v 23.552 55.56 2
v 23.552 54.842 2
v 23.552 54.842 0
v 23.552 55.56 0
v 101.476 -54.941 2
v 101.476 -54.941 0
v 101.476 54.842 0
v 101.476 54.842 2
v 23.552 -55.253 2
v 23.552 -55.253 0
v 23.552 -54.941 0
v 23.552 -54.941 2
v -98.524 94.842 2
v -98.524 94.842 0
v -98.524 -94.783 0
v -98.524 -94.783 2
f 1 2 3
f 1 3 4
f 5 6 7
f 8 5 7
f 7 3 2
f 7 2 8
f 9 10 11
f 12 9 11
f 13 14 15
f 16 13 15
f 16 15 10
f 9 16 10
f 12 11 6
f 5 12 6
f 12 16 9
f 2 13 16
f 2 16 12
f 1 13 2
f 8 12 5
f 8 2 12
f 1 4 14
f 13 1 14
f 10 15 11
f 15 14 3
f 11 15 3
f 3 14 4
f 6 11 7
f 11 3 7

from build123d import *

# Parameters (mm, degrees)
F0_W     = 77.923713997
F0_H     = 109.7831092775
F1_DEPTH = 2


with BuildPart() as f1:
    # F0 (on Top) → F1 (new body)
    with BuildSketch(Plane.XY):
        Polygon((-98.5241234303, 94.8422709107), (-98.5241234303, 54.8422709107), (23.5521625727, 54.8422709107), (23.5521625727, 55.5602938927), align=None)
        Polygon((23.5521625727, 54.8422709107), (-98.5241234303, 54.8422709107), (-98.5241234303, -54.8019595444), (-98.5241234303, -54.9408383667), (23.5521625727, -54.9408383667), align=None)
        with Locations((62.5140195712, -0.049283728)):
            Rectangle(F0_W, F0_H)
        Polygon((23.5521625727, -55.2528910339), (23.5521625727, -54.9408383667), (-98.5241234303, -54.9408383667), (-98.5241234303, -94.7827324271), align=None)
    extrude(amount=F1_DEPTH)


solid = f1.part
